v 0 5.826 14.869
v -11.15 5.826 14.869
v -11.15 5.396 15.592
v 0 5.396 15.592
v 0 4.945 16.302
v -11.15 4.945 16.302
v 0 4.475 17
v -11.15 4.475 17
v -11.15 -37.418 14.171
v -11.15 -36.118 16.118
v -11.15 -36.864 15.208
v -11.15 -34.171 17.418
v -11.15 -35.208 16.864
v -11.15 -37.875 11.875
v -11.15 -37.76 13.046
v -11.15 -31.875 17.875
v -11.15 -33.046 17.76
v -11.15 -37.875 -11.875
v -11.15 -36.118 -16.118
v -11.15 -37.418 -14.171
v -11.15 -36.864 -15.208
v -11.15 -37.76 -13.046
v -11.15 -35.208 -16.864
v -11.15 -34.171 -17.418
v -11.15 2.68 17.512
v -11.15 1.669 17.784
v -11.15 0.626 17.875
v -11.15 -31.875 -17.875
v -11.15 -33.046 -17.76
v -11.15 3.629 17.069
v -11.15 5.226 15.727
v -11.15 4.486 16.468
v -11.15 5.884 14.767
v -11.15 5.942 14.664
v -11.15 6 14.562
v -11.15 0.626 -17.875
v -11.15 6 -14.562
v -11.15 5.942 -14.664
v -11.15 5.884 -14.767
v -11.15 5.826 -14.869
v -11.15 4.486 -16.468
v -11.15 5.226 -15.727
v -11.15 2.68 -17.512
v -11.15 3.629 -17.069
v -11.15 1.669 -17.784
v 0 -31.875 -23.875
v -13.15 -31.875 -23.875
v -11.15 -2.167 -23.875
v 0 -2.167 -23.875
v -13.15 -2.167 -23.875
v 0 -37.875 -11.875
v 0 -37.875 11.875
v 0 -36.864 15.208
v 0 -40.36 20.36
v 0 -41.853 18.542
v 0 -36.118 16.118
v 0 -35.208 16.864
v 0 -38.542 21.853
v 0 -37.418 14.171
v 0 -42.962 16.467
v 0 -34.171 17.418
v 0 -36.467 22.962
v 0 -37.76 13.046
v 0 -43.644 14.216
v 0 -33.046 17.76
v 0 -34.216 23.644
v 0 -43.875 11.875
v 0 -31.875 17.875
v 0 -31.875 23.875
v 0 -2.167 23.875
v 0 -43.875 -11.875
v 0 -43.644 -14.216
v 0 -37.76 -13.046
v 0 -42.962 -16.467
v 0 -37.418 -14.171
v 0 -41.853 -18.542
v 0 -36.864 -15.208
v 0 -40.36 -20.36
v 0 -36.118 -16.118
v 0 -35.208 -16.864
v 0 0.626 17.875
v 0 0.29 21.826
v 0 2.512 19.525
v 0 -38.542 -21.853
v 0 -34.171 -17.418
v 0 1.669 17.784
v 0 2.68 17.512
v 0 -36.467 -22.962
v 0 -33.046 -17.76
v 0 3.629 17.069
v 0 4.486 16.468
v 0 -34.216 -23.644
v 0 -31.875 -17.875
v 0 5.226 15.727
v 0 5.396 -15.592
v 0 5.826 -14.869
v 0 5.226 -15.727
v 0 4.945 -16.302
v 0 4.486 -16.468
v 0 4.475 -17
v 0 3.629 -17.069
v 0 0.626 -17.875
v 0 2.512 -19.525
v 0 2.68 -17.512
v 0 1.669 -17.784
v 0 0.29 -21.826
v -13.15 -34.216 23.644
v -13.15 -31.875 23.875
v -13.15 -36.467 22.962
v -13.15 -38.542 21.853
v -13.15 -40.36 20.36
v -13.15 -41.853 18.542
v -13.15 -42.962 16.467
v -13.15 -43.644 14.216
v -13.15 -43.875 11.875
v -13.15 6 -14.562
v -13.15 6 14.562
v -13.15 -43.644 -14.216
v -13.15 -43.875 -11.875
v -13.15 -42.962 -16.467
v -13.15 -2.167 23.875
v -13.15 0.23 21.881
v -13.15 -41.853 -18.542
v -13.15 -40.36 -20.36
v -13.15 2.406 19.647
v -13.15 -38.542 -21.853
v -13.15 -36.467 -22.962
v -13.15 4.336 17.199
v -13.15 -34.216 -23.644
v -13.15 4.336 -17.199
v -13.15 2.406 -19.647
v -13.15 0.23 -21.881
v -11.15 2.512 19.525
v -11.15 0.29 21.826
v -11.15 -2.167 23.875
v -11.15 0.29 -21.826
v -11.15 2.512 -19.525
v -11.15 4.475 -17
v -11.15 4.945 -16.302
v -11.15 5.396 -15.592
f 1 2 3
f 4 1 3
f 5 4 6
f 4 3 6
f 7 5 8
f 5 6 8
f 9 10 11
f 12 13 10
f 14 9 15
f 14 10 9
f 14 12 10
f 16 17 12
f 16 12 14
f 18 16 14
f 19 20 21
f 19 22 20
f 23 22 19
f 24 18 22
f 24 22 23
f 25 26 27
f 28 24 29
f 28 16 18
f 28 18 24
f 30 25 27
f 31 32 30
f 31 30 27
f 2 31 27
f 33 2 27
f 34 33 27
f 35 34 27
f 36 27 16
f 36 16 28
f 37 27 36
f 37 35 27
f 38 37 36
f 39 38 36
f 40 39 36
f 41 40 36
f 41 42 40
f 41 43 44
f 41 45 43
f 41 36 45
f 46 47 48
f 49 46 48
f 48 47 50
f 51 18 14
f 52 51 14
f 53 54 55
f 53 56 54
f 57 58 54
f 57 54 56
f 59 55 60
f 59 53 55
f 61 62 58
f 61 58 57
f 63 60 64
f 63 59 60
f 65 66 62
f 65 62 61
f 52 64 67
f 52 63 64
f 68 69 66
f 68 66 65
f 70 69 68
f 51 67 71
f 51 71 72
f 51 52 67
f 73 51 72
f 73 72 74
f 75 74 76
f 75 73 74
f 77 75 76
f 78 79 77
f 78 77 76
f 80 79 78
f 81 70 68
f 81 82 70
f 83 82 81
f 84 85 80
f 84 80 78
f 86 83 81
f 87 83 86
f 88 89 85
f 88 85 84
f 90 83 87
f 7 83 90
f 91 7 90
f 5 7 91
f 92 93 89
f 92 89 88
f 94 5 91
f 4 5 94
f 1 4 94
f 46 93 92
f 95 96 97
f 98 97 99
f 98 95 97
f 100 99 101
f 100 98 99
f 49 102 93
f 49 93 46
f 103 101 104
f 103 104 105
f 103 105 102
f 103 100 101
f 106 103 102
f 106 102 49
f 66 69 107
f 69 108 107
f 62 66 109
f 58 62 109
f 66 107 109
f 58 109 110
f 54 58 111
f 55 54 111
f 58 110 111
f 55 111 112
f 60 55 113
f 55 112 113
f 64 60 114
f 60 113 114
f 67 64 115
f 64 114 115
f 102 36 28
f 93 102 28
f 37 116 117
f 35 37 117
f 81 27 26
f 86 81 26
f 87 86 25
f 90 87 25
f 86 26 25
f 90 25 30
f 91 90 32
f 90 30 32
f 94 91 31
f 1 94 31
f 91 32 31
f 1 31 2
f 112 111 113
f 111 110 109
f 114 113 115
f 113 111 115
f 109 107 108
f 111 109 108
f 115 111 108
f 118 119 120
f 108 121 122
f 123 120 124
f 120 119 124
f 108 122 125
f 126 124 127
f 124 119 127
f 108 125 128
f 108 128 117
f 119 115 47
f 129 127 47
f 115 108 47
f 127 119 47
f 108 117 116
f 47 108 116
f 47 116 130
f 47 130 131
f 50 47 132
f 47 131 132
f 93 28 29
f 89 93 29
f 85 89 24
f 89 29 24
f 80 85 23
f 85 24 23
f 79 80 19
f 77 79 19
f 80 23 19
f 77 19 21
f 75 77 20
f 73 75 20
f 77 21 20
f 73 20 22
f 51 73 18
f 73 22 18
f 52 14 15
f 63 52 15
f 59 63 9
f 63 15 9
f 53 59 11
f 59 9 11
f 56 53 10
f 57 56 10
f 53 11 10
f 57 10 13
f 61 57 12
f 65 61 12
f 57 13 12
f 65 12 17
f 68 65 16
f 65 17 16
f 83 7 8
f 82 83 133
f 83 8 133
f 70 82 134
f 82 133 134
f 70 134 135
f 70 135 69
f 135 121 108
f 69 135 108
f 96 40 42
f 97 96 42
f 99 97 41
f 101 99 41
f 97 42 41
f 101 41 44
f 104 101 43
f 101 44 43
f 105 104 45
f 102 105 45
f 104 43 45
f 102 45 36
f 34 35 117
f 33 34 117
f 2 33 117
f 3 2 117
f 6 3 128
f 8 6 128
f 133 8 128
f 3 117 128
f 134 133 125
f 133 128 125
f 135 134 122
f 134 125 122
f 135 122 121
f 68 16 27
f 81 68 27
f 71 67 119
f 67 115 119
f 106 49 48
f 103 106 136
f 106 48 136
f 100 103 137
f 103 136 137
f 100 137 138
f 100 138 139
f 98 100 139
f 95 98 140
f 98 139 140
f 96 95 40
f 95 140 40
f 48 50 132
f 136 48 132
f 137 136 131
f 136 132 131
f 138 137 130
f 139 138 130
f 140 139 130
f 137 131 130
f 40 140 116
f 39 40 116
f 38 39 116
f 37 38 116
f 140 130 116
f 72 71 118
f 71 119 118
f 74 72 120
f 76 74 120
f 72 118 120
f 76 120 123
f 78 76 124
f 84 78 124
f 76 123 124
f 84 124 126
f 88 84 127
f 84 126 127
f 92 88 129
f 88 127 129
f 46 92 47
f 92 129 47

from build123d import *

# Parameters (mm, degrees)
BOSS_EXTRUDE1_START = -13.15
BOSS_EXTRUDE1_DEPTH = 2
BOSS_EXTRUDE2_START = -11.15
BOSS_EXTRUDE2_DEPTH = 11.15


with BuildPart() as part:
    # Sketch2 → Boss-Extrude1 (new body)
    with BuildSketch(Plane(origin=(0, 0, 0), x_dir=(0, 0, -1), z_dir=(1, 0, 0)).offset(BOSS_EXTRUDE1_START)):
        with BuildLine():
            Line((14.561593319, 6), (-14.561593319, 6))
            ThreePointArc((-14.561593319, 6), (-19.647313485, 2.405871392), (-23.875, -2.166762072))
            Line((-23.875, -2.166762072), (-23.875, -31.875))
            ThreePointArc((-23.875, -31.875), (-20.360281374, -40.360281374), (-11.875, -43.875))
            Line((-11.875, -43.875), (11.875, -43.875))
            ThreePointArc((11.875, -43.875), (20.360281374, -40.360281374), (23.875, -31.875))
            Line((23.875, -31.875), (23.875, -2.166762072))
            ThreePointArc((23.875, -2.166762072), (19.647313485, 2.405871392), (14.561593319, 6))
        make_face()
    extrude(amount=BOSS_EXTRUDE1_DEPTH)

    # Sketch2<3> → Boss-Extrude2 (add)
    with BuildSketch(Plane(origin=(0, 0, 0), x_dir=(0, 0, -1), z_dir=(1, 0, 0)).offset(BOSS_EXTRUDE2_START)):
        with BuildLine():
            ThreePointArc((17, 4.475293665), (15.948645849, 5.173015226), (14.868697479, 5.825604258))
            ThreePointArc((14.868697479, 5.825604258), (17.069332723, 3.628967773), (17.875, 0.625818166))
            Line((17.875, 0.625818166), (17.875, -31.875))
            ThreePointArc((17.875, -31.875), (16.117640687, -36.117640687), (11.875, -37.875))
            Line((11.875, -37.875), (-11.875, -37.875))
            ThreePointArc((-11.875, -37.875), (-16.117640687, -36.117640687), (-17.875, -31.875))
            Line((-17.875, -31.875), (-17.875, 0.625818166))
            ThreePointArc((-17.875, 0.625818166), (-17.069332723, 3.628967773), (-14.868697479, 5.825604258))
            ThreePointArc((-14.868697479, 5.825604258), (-15.948645849, 5.173015226), (-17, 4.475293665))
            ThreePointArc((-17, 4.475293665), (-20.70557008, 1.431737392), (-23.875, -2.166762072))
            Line((-23.875, -2.166762072), (-23.875, -31.875))
            ThreePointArc((-23.875, -31.875), (-20.360281374, -40.360281374), (-11.875, -43.875))
            Line((-11.875, -43.875), (11.875, -43.875))
            ThreePointArc((11.875, -43.875), (20.360281374, -40.360281374), (23.875, -31.875))
            Line((23.875, -31.875), (23.875, -2.166762072))
            ThreePointArc((23.875, -2.166762072), (20.70557008, 1.431737392), (17, 4.475293665))
        make_face()
    extrude(amount=BOSS_EXTRUDE2_DEPTH)


solid = part.part
